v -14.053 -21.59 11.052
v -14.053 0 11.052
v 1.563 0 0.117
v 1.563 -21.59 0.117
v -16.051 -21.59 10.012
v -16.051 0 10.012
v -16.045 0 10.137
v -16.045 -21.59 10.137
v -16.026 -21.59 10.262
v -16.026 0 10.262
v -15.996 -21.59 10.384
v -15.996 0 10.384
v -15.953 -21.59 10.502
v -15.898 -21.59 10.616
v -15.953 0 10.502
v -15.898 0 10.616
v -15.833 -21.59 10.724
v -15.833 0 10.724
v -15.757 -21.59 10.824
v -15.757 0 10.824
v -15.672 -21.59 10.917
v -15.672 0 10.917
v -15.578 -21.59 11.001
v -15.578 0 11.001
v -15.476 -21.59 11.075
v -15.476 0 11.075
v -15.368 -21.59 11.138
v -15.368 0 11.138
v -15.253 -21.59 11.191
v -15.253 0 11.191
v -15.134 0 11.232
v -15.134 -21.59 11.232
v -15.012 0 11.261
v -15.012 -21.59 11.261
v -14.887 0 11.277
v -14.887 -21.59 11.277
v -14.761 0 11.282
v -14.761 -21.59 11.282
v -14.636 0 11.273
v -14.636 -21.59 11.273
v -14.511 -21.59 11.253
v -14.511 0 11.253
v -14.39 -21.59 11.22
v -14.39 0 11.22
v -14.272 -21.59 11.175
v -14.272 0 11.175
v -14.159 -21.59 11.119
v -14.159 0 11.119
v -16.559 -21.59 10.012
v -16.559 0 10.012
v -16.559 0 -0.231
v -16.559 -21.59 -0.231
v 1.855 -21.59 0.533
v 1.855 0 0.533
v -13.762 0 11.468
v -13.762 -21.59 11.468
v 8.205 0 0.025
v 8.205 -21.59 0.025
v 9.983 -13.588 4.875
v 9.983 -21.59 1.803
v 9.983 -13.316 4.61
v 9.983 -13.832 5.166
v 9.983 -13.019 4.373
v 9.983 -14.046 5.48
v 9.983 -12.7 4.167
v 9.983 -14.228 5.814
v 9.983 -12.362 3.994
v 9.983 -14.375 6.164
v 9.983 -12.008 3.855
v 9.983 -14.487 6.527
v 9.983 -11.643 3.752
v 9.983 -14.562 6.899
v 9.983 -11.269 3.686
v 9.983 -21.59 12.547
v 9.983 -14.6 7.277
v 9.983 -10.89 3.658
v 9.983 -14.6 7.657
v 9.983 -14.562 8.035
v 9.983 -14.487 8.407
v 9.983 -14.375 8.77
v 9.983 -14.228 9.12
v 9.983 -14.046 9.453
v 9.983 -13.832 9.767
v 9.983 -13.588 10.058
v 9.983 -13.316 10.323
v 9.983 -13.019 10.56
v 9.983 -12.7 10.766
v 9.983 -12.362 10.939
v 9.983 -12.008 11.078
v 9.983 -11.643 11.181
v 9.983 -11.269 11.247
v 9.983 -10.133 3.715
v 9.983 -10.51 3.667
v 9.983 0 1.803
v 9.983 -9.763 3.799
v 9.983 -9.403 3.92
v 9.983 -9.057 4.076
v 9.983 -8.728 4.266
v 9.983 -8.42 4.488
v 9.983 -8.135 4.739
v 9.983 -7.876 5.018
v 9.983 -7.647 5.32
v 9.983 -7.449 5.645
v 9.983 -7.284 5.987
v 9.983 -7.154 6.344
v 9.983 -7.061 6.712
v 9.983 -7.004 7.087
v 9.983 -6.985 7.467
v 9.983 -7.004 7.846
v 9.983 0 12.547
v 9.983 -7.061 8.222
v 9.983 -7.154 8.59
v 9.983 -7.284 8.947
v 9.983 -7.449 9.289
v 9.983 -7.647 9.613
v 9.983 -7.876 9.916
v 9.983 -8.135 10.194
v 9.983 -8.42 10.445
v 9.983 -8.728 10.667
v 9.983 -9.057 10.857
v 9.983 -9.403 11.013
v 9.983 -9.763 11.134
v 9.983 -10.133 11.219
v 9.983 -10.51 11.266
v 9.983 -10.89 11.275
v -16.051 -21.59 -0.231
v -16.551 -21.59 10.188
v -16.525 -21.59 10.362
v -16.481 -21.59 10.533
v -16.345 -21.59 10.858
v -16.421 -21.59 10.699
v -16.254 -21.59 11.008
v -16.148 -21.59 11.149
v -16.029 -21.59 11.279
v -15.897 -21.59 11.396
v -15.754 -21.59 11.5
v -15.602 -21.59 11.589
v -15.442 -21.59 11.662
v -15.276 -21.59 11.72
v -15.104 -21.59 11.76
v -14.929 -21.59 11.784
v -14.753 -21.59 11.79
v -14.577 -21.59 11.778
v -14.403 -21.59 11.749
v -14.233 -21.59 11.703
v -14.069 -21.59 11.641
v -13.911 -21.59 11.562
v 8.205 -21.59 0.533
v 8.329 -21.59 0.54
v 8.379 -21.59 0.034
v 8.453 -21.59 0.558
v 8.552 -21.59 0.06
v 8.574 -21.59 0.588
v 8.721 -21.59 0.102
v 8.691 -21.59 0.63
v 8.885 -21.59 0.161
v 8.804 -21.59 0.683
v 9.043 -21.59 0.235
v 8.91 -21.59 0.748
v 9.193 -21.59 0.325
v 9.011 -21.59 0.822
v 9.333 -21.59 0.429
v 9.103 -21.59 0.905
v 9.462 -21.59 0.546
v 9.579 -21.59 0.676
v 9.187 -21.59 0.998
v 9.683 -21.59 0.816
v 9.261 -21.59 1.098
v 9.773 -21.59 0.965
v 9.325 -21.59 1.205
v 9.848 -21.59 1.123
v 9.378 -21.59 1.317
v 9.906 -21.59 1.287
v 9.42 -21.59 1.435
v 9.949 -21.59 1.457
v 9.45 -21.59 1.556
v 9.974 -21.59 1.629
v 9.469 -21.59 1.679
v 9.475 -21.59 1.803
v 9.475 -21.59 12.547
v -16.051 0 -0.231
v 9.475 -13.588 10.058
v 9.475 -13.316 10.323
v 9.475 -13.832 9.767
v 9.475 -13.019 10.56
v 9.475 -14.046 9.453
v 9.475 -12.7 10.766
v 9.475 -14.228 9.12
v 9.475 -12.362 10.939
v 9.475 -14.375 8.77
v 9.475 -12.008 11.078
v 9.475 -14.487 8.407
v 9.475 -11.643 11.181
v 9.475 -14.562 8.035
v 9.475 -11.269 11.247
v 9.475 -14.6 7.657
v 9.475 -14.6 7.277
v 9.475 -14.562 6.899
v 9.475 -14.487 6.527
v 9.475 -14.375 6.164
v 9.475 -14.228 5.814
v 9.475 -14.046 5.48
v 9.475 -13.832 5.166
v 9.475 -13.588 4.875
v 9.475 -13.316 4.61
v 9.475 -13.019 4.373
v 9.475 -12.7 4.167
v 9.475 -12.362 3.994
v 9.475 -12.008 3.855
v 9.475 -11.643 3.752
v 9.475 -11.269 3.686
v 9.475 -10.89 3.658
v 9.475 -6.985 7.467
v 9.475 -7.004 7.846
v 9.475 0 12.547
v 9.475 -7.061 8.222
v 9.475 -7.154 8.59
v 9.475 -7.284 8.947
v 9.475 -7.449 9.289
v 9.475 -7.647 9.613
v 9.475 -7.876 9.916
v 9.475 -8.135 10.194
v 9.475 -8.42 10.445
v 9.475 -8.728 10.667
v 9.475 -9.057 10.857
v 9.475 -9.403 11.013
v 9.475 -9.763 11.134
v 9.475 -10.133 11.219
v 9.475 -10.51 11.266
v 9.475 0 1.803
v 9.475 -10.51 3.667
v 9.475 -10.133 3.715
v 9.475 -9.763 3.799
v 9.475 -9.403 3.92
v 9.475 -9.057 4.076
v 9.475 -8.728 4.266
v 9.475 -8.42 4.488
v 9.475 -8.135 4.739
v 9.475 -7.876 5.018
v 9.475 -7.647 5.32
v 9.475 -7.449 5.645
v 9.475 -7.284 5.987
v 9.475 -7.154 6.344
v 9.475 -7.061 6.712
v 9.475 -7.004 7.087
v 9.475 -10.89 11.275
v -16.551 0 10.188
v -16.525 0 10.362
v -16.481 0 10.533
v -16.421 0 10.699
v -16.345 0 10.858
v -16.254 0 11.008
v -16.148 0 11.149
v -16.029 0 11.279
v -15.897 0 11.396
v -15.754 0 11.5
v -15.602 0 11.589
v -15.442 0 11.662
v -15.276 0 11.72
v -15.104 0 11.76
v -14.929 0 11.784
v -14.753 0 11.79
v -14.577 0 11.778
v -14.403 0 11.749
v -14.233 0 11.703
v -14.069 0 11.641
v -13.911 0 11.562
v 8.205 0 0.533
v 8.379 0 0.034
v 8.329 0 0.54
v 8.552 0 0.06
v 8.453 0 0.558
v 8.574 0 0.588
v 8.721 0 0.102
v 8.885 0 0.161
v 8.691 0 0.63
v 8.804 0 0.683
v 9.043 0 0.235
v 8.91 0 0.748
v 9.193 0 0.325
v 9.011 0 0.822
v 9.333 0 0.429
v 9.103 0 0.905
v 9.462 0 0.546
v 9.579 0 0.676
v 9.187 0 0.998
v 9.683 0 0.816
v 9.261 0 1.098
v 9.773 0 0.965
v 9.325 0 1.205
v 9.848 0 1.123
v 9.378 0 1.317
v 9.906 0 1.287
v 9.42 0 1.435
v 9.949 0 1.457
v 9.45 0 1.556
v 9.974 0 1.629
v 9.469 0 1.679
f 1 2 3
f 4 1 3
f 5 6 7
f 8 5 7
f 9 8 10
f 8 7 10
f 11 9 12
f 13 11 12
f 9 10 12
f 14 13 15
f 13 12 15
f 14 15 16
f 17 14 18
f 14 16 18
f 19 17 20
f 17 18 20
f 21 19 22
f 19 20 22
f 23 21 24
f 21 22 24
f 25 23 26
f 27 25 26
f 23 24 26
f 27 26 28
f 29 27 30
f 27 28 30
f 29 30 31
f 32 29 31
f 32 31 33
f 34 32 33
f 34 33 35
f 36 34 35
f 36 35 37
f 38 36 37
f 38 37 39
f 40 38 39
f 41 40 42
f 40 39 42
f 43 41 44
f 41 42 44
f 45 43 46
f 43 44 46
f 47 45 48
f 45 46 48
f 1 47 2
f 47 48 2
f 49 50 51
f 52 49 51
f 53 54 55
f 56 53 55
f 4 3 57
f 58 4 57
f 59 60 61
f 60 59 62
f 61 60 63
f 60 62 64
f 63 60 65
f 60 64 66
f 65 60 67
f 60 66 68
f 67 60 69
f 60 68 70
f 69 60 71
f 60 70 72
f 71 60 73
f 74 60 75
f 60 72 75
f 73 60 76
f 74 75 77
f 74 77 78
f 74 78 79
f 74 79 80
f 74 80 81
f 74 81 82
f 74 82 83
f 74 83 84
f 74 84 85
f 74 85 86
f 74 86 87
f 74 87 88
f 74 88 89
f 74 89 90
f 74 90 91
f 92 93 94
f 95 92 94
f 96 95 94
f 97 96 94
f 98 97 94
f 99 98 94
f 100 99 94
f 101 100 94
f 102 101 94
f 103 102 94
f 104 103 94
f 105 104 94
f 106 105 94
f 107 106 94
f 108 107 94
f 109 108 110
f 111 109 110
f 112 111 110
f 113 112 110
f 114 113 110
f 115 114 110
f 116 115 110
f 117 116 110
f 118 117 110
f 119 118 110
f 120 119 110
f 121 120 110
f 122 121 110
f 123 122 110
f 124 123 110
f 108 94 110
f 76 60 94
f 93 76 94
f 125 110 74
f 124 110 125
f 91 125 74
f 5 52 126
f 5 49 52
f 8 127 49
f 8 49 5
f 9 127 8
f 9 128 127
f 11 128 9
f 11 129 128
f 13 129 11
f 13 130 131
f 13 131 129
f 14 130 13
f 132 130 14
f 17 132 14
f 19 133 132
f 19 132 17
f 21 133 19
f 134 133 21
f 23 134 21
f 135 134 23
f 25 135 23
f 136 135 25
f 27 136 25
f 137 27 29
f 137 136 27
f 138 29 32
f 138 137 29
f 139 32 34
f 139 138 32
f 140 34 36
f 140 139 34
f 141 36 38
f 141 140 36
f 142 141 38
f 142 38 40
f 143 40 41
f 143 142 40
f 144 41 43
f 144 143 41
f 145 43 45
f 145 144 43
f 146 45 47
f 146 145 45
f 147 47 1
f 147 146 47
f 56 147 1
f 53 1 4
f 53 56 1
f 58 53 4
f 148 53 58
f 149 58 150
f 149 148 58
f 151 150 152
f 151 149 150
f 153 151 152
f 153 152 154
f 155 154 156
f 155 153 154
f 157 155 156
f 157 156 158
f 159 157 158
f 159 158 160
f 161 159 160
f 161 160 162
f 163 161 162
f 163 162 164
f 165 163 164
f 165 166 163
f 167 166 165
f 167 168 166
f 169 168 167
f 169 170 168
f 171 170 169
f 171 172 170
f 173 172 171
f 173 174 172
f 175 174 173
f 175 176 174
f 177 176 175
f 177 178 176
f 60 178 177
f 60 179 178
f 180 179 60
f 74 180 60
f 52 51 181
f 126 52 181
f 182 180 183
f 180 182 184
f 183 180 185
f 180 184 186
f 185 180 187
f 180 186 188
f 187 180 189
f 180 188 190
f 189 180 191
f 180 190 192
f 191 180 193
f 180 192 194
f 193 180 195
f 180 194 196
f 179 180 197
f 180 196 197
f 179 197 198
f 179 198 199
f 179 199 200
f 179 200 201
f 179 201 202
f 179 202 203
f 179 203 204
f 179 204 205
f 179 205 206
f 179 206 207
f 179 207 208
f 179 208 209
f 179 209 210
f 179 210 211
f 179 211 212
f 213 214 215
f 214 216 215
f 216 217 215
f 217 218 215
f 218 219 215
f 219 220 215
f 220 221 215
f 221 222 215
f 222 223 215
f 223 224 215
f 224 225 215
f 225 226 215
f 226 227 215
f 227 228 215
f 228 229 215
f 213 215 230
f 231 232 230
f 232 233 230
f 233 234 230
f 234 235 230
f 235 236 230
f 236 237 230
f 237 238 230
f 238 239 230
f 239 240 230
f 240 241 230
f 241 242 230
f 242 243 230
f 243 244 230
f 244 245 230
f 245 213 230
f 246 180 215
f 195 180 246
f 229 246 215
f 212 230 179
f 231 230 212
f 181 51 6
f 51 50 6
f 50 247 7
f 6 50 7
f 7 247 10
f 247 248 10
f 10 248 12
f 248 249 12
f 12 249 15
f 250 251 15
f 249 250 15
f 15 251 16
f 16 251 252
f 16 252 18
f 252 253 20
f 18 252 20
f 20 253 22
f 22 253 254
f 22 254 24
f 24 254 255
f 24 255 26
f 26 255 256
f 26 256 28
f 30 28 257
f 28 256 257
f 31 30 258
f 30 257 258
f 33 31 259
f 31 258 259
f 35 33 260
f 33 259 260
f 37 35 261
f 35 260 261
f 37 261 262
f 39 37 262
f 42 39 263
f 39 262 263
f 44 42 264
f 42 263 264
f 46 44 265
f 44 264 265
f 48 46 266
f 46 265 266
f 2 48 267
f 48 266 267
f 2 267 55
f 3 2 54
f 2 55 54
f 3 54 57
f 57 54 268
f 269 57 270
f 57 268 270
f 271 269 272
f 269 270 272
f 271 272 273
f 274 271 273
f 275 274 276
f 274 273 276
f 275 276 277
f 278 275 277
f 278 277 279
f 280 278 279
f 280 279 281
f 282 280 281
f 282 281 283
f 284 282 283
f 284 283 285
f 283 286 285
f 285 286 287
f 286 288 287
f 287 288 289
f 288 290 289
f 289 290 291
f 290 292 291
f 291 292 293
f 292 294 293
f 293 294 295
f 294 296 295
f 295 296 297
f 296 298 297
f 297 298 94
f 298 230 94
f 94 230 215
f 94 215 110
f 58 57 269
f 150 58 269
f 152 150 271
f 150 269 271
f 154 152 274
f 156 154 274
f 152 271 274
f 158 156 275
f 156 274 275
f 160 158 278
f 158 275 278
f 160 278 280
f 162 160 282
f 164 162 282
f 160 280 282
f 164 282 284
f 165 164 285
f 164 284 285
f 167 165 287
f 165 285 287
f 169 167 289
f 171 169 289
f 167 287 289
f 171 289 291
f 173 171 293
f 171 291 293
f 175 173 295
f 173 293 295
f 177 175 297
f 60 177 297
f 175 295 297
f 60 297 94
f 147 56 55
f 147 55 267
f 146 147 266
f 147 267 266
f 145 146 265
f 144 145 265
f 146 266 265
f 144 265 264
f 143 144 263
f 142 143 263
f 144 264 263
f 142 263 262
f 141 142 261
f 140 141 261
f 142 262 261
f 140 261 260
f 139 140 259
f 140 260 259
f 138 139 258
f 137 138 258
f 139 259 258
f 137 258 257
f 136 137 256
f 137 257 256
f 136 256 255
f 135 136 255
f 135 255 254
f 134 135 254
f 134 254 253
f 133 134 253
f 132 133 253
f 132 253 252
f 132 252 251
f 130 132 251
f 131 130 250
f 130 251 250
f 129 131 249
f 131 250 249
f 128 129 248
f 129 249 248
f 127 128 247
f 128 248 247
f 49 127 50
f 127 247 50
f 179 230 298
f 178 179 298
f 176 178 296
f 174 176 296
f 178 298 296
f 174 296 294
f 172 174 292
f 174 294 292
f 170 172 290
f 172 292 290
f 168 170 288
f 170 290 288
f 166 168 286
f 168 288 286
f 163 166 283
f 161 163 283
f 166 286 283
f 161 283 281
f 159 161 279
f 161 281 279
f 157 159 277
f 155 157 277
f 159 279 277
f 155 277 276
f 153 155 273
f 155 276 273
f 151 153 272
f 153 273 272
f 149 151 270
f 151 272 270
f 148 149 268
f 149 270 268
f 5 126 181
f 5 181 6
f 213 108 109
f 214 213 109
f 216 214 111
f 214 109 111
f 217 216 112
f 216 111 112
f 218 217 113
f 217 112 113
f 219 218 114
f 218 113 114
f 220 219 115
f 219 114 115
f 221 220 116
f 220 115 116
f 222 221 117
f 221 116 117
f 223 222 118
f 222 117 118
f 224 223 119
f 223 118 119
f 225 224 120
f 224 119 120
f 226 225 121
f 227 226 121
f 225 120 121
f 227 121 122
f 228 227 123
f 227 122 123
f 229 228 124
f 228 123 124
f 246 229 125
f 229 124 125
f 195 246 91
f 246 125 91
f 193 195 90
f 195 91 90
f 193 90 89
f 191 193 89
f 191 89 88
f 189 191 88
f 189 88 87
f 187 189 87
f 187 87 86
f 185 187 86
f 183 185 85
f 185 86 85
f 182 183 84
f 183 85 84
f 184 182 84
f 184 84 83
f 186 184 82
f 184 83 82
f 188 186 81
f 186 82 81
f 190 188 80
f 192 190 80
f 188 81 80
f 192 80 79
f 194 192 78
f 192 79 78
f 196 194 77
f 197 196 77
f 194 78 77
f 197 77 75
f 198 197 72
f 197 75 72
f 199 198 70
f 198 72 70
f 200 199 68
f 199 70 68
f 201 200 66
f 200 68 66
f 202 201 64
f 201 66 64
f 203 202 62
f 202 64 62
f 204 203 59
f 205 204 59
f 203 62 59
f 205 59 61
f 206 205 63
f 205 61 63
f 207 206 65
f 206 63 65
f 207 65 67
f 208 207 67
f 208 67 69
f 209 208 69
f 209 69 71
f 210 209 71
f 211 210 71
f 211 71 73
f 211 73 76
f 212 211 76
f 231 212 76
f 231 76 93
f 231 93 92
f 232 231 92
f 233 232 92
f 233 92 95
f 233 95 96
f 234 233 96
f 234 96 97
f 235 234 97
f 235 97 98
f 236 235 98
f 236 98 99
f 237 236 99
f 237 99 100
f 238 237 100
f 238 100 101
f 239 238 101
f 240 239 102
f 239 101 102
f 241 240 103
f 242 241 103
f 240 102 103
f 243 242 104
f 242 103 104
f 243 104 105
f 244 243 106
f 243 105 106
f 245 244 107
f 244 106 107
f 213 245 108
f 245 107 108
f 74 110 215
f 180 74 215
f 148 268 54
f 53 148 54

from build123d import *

# Parameters (mm, degrees)
F1_DEPTH = 21.59
F2_R     = 3.81
F3_DEPTH = 0.508


with BuildPart() as f1:
    # F0 (on Front) → F1 (new body)
    with BuildSketch(Plane.XZ):
        with BuildLine():
            Line((-16.559356, -0.230847), (-16.051356, -0.230847))
            Line((-16.051356, -0.230847), (-16.051356, 10.011762))
            ThreePointArc((-16.051356, 10.011762), (-15.367777, 11.138266), (-14.052914, 11.052085))
            Line((-14.052914, 11.052085), (1.563488, 0.117363))
            Line((1.563488, 0.117363), (8.204864, 0.025492))
            ThreePointArc((8.204864, 0.025492), (9.4621, 0.546256), (9.982864, 1.803492))
            Line((9.982864, 1.803492), (9.982864, 12.546651))
            Line((9.982864, 12.546651), (9.474864, 12.546651))
            Line((9.474864, 12.546651), (9.474864, 1.803492))
            ThreePointArc((9.474864, 1.803492), (9.10289, 0.905467), (8.204864, 0.533492))
            Line((8.204864, 0.533492), (1.854864, 0.533492))
            Line((1.854864, 0.533492), (-13.761537, 11.468214))
            ThreePointArc((-13.761537, 11.468214), (-15.602345, 11.588867), (-16.559356, 10.011762))
            Line((-16.559356, 10.011762), (-16.559356, -0.230847))
        make_face()
    extrude(amount=F1_DEPTH)

    # F2 (on face) → F3 (cut, through all)
    with BuildSketch(Plane.YZ.offset(9.982864)):
        with Locations((-10.795, 7.466651)):
            Circle(F2_R)
    extrude(amount=-F3_DEPTH, mode=Mode.SUBTRACT)


solid = f1.part
